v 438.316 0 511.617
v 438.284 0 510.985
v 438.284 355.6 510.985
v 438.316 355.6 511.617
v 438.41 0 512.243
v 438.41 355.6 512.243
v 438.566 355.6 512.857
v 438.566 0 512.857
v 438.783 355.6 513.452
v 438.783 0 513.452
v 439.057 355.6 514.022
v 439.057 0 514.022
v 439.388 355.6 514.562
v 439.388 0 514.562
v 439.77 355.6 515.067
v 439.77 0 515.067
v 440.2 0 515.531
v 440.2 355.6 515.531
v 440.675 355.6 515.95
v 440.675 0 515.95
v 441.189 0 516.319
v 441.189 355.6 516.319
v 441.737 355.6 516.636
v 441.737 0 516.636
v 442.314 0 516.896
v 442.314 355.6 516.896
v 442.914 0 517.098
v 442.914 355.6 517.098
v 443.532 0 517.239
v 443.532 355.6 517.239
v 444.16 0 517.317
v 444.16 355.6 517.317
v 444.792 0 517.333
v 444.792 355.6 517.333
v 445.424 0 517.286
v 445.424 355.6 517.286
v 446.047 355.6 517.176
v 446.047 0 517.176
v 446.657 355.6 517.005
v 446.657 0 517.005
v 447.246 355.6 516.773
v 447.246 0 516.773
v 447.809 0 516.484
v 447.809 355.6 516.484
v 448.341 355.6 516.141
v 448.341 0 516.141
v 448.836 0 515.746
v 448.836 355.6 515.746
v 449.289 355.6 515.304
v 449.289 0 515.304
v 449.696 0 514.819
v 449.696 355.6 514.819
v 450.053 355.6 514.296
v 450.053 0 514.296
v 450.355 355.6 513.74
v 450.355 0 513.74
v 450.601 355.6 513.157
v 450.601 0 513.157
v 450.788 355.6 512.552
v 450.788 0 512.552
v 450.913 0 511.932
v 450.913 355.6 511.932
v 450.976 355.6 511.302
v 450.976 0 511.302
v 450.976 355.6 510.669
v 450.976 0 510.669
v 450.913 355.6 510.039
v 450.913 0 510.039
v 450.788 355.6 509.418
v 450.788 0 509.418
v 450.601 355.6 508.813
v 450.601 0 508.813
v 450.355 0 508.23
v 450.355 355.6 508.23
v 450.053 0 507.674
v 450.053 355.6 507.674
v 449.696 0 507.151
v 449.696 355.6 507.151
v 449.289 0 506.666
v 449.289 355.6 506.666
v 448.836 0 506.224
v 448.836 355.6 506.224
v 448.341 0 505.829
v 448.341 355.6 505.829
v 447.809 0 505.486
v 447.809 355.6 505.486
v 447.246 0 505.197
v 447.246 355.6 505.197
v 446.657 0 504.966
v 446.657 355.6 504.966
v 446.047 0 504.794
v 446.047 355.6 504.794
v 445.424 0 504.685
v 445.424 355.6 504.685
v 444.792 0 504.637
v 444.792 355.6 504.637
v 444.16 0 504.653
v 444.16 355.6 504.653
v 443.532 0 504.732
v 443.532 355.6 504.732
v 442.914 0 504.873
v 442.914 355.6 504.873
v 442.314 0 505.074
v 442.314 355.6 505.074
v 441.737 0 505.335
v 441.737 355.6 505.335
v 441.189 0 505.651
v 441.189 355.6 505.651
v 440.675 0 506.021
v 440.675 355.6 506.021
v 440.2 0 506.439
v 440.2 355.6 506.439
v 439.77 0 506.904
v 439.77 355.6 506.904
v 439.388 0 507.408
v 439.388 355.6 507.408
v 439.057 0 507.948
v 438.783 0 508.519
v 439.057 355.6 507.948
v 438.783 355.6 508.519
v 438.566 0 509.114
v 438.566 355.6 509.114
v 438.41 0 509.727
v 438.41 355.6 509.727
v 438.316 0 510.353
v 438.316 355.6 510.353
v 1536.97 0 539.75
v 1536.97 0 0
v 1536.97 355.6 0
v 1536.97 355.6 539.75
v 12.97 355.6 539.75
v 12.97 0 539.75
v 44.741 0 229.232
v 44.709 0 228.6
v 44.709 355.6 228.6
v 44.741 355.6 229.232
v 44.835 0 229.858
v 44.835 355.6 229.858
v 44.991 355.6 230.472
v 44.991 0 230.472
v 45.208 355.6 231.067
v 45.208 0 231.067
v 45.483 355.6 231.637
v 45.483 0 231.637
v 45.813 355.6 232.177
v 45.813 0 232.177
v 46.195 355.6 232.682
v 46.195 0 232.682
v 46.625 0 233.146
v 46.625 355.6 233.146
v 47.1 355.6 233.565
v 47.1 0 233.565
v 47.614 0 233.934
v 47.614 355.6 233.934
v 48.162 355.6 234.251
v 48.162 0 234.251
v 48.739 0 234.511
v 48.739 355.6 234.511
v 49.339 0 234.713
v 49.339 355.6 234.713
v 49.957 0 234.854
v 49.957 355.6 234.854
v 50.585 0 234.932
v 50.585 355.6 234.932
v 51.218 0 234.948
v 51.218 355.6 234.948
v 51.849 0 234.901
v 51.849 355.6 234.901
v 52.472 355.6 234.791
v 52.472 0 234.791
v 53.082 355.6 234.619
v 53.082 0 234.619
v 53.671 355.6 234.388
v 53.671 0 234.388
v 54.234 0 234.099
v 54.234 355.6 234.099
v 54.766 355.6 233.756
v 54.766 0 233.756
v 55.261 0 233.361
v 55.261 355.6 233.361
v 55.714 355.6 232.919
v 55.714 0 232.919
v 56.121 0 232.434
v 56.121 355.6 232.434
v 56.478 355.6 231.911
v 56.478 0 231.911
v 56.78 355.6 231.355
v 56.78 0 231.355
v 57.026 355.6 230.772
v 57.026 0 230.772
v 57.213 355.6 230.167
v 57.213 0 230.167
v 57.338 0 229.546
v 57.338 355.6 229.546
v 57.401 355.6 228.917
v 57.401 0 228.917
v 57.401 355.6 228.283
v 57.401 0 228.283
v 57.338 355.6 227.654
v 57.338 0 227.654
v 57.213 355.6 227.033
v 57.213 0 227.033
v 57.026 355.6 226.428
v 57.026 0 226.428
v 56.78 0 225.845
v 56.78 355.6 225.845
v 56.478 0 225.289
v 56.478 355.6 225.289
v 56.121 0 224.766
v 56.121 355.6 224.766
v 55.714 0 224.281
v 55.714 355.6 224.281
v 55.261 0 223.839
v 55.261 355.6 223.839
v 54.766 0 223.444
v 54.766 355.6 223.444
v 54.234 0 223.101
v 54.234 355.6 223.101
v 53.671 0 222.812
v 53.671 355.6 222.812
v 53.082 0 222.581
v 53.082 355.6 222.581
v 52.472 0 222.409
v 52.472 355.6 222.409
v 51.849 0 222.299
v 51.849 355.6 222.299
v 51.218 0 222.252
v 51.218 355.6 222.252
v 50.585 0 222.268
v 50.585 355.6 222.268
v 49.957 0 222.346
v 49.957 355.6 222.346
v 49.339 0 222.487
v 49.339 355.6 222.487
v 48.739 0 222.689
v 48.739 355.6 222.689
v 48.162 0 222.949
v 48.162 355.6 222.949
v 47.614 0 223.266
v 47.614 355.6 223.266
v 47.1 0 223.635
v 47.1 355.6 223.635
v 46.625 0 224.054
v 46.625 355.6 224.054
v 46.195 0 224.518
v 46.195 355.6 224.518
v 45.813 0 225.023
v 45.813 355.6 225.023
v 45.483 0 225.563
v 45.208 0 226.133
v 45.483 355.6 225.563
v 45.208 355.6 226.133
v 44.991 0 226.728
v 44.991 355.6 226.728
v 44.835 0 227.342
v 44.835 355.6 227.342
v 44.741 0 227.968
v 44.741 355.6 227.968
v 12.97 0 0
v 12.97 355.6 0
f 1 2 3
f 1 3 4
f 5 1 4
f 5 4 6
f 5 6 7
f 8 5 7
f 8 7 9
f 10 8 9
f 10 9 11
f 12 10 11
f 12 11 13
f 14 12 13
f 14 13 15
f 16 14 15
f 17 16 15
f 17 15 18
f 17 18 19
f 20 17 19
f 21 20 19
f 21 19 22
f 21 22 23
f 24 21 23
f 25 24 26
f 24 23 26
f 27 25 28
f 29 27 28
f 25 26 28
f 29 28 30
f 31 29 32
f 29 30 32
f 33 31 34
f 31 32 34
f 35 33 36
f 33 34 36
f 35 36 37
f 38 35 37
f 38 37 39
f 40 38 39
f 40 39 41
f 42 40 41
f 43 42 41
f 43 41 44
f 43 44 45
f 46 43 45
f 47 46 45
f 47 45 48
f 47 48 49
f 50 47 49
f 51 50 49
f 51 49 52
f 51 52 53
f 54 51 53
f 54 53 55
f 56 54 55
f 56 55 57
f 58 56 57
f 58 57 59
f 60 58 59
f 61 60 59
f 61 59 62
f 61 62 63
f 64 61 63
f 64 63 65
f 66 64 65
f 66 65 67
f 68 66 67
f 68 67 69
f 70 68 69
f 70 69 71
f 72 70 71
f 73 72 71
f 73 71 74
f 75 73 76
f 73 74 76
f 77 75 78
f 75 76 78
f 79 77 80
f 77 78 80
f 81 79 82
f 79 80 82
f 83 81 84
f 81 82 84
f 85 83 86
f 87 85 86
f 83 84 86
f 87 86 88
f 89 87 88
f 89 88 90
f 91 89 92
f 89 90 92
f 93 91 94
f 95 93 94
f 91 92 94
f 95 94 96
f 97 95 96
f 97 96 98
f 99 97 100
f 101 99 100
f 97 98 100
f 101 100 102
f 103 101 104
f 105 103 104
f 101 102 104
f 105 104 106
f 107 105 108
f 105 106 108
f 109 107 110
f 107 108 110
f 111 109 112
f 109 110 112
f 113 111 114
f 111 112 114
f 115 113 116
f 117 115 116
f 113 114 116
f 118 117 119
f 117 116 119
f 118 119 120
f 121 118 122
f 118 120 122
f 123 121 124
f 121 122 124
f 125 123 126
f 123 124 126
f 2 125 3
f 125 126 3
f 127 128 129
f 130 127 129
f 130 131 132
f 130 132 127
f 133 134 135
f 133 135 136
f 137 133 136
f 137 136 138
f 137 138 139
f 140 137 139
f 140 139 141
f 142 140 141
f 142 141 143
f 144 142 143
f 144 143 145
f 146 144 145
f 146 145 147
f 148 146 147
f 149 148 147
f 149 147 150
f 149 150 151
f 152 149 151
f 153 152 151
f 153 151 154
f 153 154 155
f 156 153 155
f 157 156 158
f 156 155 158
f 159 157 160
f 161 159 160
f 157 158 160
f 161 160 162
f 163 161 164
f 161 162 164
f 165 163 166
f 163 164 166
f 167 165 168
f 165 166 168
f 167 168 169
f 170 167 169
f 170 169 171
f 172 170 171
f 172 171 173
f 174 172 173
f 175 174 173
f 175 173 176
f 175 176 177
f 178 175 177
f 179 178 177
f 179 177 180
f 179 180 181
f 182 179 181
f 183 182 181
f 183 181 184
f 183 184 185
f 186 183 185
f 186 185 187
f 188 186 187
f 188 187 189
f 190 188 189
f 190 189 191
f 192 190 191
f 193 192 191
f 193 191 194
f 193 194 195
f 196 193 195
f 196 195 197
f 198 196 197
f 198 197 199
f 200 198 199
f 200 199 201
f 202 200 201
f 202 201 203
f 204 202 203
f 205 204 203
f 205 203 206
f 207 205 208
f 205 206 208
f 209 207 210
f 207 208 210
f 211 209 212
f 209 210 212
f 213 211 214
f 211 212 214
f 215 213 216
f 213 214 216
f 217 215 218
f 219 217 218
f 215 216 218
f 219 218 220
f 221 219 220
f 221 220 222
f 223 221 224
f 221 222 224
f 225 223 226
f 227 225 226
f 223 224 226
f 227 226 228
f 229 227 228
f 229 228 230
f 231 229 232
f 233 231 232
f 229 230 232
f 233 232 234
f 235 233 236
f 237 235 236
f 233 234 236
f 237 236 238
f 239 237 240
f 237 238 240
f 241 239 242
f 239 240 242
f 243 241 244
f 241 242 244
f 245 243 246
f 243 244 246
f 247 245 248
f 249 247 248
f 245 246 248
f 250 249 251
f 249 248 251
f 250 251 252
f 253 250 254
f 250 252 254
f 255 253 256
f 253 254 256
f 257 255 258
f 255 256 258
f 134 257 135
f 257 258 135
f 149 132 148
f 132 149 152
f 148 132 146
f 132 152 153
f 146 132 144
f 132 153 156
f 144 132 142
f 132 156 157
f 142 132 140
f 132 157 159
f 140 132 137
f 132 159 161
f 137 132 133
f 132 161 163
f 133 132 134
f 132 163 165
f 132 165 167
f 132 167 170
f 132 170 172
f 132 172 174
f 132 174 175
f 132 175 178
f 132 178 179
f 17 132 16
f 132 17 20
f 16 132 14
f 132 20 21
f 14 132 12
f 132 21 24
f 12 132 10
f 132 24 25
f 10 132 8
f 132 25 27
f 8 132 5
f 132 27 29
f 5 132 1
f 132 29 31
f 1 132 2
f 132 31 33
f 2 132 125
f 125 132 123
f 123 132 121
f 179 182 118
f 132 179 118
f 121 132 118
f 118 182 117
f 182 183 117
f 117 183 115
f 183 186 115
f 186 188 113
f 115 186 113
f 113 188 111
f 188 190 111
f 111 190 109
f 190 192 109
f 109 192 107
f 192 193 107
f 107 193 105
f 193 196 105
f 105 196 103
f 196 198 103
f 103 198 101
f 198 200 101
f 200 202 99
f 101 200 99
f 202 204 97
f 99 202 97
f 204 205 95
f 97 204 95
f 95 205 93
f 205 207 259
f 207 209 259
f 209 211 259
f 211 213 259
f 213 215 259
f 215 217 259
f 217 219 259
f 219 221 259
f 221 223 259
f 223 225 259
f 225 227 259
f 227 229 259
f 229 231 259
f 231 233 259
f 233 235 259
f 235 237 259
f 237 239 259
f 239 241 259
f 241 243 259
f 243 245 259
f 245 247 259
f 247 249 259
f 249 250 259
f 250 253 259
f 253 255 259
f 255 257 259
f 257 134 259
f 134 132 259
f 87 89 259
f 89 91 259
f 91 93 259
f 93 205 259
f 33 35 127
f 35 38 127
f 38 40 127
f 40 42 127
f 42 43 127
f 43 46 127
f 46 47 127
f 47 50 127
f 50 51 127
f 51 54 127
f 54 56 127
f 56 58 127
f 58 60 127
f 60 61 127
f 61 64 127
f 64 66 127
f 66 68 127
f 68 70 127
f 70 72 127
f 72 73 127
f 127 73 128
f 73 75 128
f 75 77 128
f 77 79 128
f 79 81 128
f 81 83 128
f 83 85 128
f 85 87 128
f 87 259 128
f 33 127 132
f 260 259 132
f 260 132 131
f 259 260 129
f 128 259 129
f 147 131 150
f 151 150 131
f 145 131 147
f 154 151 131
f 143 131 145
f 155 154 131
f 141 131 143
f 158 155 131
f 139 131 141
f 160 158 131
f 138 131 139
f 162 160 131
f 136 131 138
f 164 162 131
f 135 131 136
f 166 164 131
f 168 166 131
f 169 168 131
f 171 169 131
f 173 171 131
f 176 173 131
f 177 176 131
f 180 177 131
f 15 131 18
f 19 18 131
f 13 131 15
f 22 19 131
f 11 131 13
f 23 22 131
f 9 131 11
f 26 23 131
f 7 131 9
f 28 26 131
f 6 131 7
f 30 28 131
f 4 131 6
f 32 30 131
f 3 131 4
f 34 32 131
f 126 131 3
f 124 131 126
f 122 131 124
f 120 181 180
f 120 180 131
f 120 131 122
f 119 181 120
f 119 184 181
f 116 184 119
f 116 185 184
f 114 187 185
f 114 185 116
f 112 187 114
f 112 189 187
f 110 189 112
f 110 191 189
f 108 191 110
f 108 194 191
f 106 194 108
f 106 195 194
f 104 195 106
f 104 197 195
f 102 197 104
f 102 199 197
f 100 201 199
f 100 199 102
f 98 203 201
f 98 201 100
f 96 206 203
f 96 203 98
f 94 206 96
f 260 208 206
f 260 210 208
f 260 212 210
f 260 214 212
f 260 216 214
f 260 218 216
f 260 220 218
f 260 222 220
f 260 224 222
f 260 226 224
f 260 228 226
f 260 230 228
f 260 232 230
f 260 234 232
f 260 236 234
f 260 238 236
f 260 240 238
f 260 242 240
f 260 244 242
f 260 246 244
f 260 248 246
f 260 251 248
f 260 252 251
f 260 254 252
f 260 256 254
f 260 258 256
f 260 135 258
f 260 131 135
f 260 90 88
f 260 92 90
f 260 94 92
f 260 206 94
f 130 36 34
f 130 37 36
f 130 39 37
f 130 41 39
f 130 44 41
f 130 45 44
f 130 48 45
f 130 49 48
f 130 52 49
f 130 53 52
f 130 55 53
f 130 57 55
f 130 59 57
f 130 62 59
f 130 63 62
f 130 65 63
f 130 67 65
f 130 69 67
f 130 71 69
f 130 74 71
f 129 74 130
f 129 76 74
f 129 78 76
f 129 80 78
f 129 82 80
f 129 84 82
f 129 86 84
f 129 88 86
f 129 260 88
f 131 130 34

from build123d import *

# Parameters (mm, degrees)
F0_W     = 1524
F0_H     = 355.6
F1_DEPTH = 539.75
F3_D     = 12.7


with BuildPart() as f1:
    # F0 (on Top) → F1 (new body)
    with BuildSketch(Plane.XY):
        with Locations((774.970217, 177.8)):
            Rectangle(F0_W, F0_H)
    extrude(amount=F1_DEPTH)

    # F3 (through all)
    with Locations(Plane.XZ):
        with Locations((444.634175, 510.985237), (51.059295, 228.6)):
            Hole(F3_D / 2)


solid = f1.part
